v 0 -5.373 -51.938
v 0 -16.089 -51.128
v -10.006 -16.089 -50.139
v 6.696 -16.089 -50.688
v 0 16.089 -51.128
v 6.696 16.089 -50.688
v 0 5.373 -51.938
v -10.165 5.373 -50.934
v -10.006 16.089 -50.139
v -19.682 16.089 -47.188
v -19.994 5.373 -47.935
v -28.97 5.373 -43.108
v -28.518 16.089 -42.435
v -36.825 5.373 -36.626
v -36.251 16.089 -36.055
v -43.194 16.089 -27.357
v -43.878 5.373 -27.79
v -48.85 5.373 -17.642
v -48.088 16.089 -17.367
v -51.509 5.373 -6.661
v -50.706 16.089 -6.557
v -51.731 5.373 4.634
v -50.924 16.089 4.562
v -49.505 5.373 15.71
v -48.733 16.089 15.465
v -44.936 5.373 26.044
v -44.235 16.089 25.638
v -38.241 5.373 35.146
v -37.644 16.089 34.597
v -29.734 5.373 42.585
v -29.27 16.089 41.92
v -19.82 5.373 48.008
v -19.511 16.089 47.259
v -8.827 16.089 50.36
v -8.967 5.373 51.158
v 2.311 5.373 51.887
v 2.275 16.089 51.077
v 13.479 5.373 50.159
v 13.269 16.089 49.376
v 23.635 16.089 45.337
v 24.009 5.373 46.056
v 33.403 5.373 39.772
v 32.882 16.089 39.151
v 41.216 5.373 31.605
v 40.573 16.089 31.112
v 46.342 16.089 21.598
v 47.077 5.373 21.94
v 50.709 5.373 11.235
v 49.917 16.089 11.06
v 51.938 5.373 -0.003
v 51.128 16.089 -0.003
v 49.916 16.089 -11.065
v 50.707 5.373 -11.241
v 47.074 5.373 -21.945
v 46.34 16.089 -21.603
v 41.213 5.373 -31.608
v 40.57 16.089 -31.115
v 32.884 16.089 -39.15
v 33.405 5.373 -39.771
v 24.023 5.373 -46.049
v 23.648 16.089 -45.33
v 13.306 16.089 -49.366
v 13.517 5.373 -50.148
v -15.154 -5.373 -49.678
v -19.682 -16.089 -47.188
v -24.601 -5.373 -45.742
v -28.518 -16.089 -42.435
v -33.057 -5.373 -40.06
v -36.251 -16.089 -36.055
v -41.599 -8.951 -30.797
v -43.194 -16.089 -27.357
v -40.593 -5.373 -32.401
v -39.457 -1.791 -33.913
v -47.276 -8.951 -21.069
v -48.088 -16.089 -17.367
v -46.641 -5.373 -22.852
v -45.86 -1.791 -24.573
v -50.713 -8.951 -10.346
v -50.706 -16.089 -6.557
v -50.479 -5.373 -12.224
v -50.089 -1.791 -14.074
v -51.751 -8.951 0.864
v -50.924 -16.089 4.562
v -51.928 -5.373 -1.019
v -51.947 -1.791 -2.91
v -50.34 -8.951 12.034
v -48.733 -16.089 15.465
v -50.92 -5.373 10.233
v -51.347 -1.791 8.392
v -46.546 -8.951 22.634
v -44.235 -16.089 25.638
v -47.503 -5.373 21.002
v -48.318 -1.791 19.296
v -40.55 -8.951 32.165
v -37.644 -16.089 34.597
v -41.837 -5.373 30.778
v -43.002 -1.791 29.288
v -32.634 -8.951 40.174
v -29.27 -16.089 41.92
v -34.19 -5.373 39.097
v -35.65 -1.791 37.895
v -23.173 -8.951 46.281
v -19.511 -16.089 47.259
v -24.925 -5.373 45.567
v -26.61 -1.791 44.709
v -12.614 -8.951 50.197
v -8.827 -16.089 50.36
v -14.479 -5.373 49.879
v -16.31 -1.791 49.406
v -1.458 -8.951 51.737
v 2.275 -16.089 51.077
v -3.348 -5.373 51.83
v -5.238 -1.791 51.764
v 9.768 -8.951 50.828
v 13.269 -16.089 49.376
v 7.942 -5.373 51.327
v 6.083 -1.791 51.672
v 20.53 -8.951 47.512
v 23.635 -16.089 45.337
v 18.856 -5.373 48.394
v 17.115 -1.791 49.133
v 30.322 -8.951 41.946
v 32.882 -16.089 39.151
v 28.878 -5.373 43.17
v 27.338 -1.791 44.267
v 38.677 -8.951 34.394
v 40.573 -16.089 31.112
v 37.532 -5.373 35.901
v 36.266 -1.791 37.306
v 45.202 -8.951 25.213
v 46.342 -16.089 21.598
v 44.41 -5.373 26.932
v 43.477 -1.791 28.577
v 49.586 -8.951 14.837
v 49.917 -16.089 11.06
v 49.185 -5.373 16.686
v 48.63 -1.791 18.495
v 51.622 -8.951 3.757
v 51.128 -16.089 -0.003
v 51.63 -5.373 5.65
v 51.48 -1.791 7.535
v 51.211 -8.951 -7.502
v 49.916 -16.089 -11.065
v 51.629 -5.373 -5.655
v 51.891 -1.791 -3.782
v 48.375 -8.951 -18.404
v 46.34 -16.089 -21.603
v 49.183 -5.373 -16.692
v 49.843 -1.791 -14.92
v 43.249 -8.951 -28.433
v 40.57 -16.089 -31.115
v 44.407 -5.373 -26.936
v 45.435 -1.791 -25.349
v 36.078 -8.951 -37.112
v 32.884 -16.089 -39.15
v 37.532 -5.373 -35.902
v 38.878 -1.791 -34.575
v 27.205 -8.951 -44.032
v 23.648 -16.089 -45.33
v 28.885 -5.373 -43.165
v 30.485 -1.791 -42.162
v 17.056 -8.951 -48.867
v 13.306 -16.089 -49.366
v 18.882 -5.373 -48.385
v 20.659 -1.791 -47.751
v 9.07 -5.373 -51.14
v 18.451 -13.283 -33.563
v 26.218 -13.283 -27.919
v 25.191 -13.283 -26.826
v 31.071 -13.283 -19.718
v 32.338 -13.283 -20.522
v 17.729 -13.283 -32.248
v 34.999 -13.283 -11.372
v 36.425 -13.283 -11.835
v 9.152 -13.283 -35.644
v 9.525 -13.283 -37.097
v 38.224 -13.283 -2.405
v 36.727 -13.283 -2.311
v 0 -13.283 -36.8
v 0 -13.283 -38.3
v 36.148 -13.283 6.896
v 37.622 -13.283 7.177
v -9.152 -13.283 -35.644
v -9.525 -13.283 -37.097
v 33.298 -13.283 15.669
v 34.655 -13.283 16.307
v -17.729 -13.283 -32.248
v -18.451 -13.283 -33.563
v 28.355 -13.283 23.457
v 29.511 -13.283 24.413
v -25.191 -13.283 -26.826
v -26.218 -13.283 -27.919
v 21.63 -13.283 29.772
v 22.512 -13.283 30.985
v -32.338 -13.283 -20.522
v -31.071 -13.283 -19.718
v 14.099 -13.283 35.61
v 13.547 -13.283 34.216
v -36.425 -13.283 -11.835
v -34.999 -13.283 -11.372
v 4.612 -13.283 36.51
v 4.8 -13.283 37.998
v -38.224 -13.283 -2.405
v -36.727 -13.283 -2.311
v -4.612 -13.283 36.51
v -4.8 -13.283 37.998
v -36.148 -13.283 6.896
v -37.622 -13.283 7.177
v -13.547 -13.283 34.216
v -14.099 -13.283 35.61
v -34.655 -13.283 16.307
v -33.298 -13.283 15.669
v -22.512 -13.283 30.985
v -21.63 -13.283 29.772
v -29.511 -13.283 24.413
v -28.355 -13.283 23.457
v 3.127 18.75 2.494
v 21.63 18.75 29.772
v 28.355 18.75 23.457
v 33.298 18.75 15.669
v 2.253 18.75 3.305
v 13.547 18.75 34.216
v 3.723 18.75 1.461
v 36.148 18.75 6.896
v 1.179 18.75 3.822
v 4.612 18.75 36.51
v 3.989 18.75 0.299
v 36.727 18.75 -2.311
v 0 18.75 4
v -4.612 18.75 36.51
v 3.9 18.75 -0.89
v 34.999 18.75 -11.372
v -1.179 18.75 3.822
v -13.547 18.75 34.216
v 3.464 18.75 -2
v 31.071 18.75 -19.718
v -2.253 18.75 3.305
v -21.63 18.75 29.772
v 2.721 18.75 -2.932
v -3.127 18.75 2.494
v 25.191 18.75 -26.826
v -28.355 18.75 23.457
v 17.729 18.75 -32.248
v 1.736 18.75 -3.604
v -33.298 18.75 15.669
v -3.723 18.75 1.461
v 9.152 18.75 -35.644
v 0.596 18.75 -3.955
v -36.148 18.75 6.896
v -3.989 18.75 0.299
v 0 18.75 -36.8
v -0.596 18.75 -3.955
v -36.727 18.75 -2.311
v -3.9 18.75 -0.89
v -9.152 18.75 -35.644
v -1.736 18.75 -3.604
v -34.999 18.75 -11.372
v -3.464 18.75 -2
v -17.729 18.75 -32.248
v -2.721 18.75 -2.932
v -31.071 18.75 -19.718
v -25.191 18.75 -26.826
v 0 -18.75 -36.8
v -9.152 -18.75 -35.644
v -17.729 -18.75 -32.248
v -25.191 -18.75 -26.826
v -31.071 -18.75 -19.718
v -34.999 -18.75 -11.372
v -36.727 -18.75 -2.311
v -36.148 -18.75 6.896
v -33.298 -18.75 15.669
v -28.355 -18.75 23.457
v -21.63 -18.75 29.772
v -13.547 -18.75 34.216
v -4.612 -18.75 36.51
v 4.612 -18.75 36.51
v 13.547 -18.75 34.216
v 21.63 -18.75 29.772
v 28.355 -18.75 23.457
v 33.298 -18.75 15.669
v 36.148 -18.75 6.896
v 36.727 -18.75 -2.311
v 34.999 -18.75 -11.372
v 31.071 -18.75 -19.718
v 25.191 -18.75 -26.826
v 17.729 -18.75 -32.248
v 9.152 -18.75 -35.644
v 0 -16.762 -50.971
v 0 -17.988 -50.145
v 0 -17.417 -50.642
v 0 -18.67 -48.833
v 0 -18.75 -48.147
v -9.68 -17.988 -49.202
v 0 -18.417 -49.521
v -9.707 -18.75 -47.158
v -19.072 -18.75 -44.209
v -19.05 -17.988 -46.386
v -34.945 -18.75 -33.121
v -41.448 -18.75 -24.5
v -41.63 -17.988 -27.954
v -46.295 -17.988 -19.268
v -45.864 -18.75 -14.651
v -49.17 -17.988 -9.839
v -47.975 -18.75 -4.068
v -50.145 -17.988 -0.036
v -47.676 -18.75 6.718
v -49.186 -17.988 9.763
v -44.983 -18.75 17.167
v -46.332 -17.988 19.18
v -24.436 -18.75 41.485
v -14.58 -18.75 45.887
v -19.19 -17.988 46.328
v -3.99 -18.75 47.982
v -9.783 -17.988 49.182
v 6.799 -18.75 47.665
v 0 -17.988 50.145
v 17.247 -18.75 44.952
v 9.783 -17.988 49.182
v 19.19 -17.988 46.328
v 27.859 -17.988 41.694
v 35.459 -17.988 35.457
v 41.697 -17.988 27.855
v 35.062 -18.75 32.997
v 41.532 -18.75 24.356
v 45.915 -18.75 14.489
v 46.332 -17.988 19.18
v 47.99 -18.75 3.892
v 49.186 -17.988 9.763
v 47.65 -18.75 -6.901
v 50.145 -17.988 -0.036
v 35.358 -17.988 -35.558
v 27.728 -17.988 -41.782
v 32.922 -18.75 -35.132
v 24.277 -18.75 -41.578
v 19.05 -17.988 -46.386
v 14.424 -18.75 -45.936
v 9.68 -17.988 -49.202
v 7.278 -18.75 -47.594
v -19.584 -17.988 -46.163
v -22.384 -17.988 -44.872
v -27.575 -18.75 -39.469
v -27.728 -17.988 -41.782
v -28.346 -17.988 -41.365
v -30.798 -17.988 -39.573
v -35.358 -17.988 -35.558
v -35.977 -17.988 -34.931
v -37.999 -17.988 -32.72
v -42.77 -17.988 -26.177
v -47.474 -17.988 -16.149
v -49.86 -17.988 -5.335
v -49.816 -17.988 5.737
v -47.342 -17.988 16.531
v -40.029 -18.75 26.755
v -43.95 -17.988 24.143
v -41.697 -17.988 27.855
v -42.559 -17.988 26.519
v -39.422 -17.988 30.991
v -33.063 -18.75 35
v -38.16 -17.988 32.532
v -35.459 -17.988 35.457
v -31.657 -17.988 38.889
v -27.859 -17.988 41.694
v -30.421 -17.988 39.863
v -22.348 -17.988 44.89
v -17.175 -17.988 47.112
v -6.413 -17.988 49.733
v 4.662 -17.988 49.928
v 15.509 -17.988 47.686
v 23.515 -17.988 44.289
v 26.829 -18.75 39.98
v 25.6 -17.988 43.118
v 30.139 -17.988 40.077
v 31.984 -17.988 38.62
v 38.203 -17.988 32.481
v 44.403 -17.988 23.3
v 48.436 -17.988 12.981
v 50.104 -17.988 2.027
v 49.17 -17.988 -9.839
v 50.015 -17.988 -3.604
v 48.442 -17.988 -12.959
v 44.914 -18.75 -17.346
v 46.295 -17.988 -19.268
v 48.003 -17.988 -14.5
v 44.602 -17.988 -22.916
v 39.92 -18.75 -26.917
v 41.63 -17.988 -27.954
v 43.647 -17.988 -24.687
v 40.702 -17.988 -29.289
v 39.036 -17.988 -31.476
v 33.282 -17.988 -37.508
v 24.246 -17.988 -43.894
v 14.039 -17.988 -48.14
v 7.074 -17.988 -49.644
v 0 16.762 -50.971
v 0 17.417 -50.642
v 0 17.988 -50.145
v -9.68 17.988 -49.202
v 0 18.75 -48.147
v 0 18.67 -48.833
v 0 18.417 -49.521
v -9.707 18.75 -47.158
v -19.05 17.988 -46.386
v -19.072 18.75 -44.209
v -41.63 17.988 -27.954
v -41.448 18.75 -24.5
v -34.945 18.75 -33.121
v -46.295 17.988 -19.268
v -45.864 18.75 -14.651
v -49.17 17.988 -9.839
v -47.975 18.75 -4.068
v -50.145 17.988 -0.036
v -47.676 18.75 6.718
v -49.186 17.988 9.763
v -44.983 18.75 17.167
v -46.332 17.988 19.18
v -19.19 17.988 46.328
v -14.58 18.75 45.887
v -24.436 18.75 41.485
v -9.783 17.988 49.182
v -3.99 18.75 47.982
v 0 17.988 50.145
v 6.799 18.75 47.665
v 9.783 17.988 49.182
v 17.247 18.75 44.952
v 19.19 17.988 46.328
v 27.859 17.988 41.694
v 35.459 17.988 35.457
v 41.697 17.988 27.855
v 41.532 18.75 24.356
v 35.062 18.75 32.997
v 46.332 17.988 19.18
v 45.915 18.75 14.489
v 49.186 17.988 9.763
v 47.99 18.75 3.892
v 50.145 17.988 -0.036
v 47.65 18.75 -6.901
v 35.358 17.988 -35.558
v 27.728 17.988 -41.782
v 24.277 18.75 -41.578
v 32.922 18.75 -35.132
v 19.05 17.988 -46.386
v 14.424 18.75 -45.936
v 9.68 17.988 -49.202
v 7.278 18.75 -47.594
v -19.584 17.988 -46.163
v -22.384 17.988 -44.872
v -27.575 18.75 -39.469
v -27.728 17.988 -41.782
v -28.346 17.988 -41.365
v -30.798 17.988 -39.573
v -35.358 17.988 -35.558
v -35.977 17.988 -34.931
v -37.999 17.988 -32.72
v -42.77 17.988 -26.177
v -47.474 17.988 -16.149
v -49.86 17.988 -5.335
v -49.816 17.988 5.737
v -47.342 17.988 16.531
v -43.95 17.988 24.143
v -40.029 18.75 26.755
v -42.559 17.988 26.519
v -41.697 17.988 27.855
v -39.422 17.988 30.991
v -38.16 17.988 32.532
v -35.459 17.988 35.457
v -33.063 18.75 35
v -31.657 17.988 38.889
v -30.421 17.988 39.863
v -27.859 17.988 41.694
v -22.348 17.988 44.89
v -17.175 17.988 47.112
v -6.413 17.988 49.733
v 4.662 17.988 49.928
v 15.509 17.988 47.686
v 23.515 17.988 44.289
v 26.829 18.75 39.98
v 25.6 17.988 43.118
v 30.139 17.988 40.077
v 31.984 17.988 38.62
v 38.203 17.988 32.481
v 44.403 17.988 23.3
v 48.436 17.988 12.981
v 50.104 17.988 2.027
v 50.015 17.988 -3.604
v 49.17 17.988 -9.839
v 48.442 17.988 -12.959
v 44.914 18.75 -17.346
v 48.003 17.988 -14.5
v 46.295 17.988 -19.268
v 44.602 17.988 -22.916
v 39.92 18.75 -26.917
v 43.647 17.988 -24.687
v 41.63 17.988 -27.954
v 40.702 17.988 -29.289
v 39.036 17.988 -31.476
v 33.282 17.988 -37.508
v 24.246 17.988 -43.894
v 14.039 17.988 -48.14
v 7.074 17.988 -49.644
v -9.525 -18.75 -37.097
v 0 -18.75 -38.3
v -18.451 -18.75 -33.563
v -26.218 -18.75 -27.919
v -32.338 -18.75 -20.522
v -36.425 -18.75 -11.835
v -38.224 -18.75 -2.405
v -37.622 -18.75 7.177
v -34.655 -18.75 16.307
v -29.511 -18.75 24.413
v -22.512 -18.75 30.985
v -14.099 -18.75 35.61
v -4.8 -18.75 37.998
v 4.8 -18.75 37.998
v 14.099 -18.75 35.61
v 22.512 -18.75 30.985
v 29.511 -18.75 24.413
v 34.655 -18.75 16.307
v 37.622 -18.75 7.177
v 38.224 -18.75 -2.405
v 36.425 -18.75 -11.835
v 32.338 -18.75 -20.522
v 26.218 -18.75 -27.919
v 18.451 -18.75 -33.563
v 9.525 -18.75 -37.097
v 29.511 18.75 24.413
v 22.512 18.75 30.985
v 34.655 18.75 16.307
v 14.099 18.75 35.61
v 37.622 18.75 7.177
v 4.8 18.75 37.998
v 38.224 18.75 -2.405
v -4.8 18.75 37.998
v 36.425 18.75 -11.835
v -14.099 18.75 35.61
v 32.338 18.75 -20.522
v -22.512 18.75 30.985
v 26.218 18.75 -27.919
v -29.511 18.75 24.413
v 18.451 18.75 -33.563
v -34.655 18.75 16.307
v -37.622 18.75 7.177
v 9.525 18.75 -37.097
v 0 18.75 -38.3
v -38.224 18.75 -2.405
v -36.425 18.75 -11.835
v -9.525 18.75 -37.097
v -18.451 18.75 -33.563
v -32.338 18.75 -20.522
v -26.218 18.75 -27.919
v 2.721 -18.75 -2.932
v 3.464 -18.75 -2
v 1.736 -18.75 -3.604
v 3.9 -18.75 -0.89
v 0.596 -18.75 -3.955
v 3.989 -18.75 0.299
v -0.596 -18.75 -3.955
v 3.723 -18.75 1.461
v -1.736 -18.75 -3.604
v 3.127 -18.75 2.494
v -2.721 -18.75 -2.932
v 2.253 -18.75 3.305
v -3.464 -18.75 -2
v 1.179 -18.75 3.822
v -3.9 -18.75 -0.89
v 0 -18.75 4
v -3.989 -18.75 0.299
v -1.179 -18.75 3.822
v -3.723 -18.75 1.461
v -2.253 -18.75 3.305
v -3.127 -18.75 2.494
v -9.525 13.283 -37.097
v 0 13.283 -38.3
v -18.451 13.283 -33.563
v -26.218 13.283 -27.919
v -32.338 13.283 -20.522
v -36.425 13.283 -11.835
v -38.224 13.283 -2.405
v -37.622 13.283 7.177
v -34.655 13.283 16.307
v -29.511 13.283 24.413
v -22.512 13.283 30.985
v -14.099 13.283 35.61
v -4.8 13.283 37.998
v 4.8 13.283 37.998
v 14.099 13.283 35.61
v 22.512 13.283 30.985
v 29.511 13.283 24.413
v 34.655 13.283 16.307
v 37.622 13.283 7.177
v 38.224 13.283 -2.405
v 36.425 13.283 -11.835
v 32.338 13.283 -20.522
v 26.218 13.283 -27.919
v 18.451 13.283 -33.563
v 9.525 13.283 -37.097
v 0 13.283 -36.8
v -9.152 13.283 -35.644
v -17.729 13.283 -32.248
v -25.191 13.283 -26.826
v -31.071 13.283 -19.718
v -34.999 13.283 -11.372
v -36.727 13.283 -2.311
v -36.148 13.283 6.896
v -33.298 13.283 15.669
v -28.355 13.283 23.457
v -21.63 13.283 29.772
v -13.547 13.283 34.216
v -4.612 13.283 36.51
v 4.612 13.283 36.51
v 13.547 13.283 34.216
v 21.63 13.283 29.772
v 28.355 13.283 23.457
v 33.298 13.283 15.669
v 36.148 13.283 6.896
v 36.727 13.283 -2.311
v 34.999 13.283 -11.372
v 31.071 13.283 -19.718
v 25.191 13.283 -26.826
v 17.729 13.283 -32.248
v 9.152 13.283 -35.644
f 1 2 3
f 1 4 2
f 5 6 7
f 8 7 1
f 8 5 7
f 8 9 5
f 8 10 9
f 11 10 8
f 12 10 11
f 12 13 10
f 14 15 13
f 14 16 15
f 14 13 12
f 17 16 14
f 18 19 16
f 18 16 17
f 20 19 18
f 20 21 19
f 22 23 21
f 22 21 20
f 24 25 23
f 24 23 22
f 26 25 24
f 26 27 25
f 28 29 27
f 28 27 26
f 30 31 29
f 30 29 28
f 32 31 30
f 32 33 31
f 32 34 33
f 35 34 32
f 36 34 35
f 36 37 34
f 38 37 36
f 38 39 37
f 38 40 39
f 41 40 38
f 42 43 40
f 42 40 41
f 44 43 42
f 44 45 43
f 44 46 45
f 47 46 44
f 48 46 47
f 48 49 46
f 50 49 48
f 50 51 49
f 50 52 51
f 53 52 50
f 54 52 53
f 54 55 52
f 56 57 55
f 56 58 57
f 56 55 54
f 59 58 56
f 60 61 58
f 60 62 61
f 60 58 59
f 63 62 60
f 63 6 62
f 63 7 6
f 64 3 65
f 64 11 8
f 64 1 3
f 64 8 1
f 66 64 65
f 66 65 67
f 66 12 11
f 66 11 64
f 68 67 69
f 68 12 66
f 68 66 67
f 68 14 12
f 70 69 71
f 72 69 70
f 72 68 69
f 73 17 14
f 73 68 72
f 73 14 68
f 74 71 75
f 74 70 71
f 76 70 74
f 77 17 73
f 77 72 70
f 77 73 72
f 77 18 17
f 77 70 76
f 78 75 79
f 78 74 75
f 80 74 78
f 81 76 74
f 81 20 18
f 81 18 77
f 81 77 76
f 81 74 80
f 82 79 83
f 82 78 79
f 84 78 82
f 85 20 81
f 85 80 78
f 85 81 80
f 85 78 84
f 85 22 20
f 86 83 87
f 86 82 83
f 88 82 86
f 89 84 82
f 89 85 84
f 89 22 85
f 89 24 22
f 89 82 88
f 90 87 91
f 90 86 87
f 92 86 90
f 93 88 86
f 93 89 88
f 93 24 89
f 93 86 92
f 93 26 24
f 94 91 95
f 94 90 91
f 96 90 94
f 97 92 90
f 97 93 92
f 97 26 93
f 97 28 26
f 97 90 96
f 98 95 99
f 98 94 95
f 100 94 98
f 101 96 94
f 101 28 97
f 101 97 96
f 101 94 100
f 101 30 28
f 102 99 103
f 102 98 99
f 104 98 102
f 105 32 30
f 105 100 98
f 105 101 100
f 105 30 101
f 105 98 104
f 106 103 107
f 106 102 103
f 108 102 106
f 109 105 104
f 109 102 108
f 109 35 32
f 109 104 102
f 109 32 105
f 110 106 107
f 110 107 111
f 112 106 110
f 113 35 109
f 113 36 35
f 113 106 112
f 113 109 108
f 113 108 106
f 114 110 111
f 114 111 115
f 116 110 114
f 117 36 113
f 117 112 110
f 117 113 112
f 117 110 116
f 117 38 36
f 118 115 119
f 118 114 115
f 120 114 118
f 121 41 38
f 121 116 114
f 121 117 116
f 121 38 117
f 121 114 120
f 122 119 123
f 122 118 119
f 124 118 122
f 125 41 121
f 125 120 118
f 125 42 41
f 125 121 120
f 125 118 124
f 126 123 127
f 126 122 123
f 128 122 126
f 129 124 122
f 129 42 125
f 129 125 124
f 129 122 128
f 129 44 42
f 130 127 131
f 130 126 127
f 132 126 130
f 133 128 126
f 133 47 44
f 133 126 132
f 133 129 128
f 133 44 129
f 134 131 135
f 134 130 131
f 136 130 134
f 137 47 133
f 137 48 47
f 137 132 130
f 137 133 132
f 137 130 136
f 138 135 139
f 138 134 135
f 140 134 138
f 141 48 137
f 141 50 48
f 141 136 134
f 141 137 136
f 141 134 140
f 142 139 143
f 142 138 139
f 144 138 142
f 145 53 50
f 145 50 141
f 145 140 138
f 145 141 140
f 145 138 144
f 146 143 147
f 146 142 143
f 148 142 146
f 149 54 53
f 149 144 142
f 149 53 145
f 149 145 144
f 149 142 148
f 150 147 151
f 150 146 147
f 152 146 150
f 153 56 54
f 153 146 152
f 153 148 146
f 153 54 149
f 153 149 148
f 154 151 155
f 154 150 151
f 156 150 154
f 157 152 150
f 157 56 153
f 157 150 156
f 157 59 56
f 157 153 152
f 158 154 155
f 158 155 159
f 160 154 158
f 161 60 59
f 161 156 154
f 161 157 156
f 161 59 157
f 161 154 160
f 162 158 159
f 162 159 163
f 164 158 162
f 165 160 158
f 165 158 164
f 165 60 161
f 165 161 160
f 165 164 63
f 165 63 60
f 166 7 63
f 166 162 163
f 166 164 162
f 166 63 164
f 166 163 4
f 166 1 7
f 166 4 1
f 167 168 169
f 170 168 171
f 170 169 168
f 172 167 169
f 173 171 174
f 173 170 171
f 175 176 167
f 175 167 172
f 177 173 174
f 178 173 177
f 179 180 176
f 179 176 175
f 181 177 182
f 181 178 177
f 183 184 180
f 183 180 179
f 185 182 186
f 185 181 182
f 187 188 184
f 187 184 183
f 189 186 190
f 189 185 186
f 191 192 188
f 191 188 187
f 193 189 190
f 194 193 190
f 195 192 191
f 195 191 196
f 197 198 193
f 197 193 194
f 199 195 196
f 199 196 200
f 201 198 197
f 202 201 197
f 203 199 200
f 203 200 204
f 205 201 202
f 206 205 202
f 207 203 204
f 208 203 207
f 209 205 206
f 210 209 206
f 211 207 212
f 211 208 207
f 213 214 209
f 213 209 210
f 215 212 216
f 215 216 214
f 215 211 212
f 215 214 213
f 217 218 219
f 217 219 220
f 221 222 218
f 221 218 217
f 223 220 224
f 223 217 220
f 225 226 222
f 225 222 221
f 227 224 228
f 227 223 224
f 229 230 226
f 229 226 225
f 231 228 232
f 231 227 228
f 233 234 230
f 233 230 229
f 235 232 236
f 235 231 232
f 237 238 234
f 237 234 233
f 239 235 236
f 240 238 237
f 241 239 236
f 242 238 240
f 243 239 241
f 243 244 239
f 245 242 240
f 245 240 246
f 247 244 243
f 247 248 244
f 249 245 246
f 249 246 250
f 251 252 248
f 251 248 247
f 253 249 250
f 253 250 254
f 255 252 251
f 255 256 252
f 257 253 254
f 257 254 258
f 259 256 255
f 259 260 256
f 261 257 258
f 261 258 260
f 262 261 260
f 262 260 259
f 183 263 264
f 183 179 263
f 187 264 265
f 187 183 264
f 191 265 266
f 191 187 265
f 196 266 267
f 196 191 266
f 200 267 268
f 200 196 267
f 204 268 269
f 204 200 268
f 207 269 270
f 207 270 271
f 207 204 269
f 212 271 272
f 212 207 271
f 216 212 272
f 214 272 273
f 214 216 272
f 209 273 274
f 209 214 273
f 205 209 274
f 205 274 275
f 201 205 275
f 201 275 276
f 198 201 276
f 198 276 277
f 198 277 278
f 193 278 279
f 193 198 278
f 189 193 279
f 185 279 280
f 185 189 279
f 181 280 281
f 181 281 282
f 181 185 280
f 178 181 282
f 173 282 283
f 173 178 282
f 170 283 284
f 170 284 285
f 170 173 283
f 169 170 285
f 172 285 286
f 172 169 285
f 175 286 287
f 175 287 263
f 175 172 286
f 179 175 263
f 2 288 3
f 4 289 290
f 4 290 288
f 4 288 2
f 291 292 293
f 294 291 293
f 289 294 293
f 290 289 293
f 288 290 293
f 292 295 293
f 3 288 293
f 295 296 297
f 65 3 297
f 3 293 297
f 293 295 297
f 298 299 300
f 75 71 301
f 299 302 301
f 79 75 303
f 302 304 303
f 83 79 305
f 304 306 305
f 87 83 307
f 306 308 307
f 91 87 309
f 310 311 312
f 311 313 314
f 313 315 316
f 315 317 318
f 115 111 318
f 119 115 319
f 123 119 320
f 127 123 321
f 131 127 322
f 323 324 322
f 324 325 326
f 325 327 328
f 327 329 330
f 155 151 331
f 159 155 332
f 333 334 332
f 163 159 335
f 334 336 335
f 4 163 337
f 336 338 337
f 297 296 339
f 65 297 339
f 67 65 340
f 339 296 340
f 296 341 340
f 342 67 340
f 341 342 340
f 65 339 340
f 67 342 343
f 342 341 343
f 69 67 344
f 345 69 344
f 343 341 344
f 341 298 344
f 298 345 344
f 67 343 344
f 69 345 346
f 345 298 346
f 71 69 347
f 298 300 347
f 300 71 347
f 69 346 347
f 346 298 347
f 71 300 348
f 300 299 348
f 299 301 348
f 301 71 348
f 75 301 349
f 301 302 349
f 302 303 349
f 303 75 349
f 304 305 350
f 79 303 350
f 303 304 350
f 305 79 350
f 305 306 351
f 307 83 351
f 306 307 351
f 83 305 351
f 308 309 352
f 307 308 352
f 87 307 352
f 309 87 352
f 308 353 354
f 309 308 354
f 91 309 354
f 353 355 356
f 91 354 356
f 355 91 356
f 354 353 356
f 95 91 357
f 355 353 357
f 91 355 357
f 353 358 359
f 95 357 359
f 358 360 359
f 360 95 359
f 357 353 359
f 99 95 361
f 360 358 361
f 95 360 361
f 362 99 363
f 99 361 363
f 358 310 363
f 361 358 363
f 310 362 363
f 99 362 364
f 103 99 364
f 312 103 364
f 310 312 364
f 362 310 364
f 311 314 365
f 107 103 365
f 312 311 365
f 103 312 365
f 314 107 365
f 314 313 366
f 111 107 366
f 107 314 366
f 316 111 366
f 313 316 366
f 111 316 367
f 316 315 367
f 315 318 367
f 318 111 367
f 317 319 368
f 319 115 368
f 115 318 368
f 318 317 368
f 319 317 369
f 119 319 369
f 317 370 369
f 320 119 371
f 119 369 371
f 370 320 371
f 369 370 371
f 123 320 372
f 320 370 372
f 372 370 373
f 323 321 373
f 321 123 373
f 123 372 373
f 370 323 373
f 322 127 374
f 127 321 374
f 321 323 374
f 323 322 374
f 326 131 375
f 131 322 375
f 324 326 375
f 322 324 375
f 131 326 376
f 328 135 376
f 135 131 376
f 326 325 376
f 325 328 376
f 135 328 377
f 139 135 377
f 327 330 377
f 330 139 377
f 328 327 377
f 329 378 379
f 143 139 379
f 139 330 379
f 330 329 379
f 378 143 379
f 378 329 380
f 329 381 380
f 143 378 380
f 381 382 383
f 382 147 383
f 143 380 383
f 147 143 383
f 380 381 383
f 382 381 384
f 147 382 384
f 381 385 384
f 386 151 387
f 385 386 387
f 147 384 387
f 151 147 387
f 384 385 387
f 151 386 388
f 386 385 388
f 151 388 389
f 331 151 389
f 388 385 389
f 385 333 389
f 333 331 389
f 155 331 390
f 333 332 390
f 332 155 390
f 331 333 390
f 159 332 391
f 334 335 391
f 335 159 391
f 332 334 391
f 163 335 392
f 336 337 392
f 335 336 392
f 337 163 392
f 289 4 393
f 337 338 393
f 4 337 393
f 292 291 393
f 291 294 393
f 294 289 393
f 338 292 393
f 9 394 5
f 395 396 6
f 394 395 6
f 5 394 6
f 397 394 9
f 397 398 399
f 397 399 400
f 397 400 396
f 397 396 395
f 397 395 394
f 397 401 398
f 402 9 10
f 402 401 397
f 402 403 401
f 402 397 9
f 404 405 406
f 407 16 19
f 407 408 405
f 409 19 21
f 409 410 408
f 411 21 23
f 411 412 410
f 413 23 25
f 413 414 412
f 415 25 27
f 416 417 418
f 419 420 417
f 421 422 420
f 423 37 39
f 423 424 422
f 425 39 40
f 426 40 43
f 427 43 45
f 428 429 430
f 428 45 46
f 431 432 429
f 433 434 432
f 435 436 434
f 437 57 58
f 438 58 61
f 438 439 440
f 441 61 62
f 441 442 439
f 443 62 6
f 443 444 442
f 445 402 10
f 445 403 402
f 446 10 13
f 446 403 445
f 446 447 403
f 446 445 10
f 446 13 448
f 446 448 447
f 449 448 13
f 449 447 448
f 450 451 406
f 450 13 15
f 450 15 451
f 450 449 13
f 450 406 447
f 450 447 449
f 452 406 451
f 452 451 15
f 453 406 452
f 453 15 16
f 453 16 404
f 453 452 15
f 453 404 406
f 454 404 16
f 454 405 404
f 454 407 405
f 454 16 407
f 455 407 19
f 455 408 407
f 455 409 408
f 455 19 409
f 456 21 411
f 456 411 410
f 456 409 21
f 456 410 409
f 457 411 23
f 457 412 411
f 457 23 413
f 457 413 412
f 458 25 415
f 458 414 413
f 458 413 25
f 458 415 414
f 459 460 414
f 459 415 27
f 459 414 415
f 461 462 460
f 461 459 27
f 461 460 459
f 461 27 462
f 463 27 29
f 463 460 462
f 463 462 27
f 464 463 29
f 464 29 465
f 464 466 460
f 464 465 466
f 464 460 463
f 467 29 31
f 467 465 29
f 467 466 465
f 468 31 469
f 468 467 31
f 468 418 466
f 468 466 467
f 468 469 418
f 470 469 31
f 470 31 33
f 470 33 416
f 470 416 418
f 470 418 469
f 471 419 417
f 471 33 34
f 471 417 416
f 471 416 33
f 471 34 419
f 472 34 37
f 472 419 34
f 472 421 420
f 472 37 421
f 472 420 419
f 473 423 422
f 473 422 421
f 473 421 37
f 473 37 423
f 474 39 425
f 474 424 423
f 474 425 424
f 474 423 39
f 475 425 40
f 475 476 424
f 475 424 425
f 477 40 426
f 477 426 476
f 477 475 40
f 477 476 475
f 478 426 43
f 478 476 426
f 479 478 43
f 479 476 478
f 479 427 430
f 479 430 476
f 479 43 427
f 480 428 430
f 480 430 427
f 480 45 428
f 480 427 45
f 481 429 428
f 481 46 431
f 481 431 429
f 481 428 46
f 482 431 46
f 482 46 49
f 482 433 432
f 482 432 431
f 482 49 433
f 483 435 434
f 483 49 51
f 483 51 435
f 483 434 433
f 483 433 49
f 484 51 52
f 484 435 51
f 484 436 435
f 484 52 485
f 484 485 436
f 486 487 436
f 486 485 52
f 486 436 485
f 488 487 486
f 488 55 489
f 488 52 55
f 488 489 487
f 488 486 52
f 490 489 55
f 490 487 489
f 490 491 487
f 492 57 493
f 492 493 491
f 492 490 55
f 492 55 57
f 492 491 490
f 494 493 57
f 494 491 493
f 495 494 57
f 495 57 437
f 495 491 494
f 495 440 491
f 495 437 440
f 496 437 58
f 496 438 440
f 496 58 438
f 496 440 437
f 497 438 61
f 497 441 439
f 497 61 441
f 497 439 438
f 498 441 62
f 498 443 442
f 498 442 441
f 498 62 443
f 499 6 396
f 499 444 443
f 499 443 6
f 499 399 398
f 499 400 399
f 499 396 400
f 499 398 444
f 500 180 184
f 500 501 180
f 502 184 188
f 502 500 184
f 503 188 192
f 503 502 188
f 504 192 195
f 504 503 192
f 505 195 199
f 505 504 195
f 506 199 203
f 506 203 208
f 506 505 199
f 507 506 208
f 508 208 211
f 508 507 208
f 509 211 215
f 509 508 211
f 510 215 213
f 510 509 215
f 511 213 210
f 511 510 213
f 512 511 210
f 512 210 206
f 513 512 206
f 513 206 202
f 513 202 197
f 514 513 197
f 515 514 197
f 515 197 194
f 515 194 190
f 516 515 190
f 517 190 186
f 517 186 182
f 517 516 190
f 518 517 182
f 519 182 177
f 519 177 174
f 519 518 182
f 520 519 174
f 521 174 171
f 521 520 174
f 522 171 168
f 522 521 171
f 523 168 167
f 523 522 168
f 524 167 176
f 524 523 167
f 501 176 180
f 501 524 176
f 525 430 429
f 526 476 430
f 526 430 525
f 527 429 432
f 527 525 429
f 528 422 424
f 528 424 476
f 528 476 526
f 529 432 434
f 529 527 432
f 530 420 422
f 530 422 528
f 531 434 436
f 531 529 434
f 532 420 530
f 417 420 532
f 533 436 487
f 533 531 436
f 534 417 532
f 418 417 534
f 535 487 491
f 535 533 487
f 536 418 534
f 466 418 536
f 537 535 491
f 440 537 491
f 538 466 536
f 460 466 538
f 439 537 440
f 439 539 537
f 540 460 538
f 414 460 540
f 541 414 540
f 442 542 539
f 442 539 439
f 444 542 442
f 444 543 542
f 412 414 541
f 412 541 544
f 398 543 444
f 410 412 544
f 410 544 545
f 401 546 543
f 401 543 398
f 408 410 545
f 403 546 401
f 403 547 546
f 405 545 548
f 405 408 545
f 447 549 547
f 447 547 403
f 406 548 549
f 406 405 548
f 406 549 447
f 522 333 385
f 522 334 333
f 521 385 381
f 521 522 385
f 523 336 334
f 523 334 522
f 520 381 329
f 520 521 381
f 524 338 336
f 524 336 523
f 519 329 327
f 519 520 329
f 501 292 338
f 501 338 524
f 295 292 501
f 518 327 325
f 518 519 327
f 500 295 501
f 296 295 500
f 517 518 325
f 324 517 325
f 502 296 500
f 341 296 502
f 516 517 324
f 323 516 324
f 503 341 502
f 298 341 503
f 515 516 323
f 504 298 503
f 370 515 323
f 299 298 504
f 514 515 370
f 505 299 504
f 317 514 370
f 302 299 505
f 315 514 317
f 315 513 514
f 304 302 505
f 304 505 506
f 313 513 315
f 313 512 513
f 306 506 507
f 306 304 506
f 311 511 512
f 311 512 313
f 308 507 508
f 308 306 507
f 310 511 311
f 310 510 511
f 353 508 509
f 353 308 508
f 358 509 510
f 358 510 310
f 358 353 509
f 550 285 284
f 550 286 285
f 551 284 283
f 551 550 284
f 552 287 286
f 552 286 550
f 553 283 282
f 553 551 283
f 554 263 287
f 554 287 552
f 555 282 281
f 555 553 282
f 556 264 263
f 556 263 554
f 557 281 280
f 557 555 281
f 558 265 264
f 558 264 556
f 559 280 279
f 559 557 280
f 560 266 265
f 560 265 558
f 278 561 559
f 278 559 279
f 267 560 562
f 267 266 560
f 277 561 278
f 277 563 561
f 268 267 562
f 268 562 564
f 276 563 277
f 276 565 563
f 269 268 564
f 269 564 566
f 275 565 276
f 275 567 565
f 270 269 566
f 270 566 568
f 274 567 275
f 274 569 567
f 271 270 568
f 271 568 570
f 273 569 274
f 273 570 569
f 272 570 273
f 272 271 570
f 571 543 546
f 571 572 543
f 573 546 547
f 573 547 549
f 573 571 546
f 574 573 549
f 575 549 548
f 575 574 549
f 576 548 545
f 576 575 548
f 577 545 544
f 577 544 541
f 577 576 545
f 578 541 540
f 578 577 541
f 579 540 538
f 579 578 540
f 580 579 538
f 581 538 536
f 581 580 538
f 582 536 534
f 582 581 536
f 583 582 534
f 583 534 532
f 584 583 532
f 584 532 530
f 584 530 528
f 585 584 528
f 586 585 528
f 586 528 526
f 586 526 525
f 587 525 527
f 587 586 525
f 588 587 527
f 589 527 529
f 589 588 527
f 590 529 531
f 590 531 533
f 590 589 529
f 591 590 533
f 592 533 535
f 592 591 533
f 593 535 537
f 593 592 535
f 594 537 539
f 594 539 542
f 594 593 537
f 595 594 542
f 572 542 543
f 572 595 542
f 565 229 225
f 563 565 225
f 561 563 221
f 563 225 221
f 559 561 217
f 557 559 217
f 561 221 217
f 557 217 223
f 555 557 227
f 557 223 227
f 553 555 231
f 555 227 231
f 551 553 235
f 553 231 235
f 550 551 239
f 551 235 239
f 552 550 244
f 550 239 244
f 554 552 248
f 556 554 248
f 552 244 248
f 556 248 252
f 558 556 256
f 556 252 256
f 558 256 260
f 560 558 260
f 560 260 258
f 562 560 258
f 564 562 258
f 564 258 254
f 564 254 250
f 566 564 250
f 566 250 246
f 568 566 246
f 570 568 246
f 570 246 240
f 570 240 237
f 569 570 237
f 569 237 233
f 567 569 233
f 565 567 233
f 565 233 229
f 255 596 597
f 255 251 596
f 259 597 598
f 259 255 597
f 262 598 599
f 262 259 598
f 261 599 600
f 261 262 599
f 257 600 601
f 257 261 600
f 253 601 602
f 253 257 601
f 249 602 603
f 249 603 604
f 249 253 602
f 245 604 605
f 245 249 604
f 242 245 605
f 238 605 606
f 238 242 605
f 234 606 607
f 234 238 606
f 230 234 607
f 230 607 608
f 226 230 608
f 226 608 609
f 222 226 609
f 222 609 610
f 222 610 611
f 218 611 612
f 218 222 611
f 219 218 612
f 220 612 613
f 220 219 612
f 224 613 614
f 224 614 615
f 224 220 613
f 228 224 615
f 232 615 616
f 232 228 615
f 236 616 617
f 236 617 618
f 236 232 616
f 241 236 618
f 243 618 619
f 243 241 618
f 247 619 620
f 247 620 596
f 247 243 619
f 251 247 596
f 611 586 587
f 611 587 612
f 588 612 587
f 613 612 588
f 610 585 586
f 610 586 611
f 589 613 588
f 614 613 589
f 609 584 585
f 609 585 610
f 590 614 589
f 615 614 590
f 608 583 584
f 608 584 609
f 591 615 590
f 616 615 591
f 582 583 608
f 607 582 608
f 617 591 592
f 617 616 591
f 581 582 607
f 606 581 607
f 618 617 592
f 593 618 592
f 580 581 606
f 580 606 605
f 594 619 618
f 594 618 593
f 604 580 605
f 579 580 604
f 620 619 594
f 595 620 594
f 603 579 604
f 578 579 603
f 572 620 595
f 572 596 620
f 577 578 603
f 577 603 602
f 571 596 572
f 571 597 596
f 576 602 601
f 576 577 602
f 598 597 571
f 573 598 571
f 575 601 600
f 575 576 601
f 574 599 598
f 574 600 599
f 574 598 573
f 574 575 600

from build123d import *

# Parameters (mm, degrees)
FILLET1_R          = 3
SKETCH2_R          = 4
CUT_EXTRUDE1_DEPTH = 137


with BuildPart() as part:
    # Sketch1 → Revolve2 (revolve)
    with BuildSketch(Plane.XY, mode=Mode.PRIVATE) as revolve2_sk:
        with BuildLine():
            Line((-50.8, 18.75), (-38.3, 18.75))
            Line((-38.3, 18.75), (-38.3, 13.2825304))
            Line((-38.3, 13.2825304), (-36.8, 13.2825304))
            Line((-36.8, 13.2825304), (-36.8, 18.75))
            Line((-36.8, 18.75), (0, 18.75))
            Line((0, 18.75), (0, -18.75))
            Line((0, -18.75), (-36.8, -18.75))
            Line((-36.8, -18.75), (-36.8, -13.2825304))
            Line((-36.8, -13.2825304), (-38.3, -13.2825304))
            Line((-38.3, -13.2825304), (-38.3, -18.75))
            Line((-38.3, -18.75), (-50.8, -18.75))
            ThreePointArc((-50.8, -18.75), (-52.039597726, 0), (-50.8, 18.75))
        make_face()
    revolve(revolve2_sk.sketch.rotate(Axis((0, -18.75, 0), (0, 1, 0)), 270), axis=Axis((0, -18.75, 0), (0, 1, 0)))  # turned: the seam where the file's is

    # Fillet1
    fillet1_edges = [part.edges().sort_by_distance(p)[0] for p in [
        (0, -18.75, 50.8),
        (0, 18.75, 50.8),
    ]]
    fillet(fillet1_edges, radius=FILLET1_R)

    # Sketch2 → Cut-Extrude1 (cut)
    with BuildSketch(Plane(origin=(0, 18.75, 0), x_dir=(1, 0, 0), z_dir=(0, 1, 0))):
        with Locations(Location((0, 0, 0), (0, 0, 270))):  # turned: the seam where the file's is
            Circle(SKETCH2_R)
    extrude(amount=-CUT_EXTRUDE1_DEPTH, mode=Mode.SUBTRACT)


solid = part.part
